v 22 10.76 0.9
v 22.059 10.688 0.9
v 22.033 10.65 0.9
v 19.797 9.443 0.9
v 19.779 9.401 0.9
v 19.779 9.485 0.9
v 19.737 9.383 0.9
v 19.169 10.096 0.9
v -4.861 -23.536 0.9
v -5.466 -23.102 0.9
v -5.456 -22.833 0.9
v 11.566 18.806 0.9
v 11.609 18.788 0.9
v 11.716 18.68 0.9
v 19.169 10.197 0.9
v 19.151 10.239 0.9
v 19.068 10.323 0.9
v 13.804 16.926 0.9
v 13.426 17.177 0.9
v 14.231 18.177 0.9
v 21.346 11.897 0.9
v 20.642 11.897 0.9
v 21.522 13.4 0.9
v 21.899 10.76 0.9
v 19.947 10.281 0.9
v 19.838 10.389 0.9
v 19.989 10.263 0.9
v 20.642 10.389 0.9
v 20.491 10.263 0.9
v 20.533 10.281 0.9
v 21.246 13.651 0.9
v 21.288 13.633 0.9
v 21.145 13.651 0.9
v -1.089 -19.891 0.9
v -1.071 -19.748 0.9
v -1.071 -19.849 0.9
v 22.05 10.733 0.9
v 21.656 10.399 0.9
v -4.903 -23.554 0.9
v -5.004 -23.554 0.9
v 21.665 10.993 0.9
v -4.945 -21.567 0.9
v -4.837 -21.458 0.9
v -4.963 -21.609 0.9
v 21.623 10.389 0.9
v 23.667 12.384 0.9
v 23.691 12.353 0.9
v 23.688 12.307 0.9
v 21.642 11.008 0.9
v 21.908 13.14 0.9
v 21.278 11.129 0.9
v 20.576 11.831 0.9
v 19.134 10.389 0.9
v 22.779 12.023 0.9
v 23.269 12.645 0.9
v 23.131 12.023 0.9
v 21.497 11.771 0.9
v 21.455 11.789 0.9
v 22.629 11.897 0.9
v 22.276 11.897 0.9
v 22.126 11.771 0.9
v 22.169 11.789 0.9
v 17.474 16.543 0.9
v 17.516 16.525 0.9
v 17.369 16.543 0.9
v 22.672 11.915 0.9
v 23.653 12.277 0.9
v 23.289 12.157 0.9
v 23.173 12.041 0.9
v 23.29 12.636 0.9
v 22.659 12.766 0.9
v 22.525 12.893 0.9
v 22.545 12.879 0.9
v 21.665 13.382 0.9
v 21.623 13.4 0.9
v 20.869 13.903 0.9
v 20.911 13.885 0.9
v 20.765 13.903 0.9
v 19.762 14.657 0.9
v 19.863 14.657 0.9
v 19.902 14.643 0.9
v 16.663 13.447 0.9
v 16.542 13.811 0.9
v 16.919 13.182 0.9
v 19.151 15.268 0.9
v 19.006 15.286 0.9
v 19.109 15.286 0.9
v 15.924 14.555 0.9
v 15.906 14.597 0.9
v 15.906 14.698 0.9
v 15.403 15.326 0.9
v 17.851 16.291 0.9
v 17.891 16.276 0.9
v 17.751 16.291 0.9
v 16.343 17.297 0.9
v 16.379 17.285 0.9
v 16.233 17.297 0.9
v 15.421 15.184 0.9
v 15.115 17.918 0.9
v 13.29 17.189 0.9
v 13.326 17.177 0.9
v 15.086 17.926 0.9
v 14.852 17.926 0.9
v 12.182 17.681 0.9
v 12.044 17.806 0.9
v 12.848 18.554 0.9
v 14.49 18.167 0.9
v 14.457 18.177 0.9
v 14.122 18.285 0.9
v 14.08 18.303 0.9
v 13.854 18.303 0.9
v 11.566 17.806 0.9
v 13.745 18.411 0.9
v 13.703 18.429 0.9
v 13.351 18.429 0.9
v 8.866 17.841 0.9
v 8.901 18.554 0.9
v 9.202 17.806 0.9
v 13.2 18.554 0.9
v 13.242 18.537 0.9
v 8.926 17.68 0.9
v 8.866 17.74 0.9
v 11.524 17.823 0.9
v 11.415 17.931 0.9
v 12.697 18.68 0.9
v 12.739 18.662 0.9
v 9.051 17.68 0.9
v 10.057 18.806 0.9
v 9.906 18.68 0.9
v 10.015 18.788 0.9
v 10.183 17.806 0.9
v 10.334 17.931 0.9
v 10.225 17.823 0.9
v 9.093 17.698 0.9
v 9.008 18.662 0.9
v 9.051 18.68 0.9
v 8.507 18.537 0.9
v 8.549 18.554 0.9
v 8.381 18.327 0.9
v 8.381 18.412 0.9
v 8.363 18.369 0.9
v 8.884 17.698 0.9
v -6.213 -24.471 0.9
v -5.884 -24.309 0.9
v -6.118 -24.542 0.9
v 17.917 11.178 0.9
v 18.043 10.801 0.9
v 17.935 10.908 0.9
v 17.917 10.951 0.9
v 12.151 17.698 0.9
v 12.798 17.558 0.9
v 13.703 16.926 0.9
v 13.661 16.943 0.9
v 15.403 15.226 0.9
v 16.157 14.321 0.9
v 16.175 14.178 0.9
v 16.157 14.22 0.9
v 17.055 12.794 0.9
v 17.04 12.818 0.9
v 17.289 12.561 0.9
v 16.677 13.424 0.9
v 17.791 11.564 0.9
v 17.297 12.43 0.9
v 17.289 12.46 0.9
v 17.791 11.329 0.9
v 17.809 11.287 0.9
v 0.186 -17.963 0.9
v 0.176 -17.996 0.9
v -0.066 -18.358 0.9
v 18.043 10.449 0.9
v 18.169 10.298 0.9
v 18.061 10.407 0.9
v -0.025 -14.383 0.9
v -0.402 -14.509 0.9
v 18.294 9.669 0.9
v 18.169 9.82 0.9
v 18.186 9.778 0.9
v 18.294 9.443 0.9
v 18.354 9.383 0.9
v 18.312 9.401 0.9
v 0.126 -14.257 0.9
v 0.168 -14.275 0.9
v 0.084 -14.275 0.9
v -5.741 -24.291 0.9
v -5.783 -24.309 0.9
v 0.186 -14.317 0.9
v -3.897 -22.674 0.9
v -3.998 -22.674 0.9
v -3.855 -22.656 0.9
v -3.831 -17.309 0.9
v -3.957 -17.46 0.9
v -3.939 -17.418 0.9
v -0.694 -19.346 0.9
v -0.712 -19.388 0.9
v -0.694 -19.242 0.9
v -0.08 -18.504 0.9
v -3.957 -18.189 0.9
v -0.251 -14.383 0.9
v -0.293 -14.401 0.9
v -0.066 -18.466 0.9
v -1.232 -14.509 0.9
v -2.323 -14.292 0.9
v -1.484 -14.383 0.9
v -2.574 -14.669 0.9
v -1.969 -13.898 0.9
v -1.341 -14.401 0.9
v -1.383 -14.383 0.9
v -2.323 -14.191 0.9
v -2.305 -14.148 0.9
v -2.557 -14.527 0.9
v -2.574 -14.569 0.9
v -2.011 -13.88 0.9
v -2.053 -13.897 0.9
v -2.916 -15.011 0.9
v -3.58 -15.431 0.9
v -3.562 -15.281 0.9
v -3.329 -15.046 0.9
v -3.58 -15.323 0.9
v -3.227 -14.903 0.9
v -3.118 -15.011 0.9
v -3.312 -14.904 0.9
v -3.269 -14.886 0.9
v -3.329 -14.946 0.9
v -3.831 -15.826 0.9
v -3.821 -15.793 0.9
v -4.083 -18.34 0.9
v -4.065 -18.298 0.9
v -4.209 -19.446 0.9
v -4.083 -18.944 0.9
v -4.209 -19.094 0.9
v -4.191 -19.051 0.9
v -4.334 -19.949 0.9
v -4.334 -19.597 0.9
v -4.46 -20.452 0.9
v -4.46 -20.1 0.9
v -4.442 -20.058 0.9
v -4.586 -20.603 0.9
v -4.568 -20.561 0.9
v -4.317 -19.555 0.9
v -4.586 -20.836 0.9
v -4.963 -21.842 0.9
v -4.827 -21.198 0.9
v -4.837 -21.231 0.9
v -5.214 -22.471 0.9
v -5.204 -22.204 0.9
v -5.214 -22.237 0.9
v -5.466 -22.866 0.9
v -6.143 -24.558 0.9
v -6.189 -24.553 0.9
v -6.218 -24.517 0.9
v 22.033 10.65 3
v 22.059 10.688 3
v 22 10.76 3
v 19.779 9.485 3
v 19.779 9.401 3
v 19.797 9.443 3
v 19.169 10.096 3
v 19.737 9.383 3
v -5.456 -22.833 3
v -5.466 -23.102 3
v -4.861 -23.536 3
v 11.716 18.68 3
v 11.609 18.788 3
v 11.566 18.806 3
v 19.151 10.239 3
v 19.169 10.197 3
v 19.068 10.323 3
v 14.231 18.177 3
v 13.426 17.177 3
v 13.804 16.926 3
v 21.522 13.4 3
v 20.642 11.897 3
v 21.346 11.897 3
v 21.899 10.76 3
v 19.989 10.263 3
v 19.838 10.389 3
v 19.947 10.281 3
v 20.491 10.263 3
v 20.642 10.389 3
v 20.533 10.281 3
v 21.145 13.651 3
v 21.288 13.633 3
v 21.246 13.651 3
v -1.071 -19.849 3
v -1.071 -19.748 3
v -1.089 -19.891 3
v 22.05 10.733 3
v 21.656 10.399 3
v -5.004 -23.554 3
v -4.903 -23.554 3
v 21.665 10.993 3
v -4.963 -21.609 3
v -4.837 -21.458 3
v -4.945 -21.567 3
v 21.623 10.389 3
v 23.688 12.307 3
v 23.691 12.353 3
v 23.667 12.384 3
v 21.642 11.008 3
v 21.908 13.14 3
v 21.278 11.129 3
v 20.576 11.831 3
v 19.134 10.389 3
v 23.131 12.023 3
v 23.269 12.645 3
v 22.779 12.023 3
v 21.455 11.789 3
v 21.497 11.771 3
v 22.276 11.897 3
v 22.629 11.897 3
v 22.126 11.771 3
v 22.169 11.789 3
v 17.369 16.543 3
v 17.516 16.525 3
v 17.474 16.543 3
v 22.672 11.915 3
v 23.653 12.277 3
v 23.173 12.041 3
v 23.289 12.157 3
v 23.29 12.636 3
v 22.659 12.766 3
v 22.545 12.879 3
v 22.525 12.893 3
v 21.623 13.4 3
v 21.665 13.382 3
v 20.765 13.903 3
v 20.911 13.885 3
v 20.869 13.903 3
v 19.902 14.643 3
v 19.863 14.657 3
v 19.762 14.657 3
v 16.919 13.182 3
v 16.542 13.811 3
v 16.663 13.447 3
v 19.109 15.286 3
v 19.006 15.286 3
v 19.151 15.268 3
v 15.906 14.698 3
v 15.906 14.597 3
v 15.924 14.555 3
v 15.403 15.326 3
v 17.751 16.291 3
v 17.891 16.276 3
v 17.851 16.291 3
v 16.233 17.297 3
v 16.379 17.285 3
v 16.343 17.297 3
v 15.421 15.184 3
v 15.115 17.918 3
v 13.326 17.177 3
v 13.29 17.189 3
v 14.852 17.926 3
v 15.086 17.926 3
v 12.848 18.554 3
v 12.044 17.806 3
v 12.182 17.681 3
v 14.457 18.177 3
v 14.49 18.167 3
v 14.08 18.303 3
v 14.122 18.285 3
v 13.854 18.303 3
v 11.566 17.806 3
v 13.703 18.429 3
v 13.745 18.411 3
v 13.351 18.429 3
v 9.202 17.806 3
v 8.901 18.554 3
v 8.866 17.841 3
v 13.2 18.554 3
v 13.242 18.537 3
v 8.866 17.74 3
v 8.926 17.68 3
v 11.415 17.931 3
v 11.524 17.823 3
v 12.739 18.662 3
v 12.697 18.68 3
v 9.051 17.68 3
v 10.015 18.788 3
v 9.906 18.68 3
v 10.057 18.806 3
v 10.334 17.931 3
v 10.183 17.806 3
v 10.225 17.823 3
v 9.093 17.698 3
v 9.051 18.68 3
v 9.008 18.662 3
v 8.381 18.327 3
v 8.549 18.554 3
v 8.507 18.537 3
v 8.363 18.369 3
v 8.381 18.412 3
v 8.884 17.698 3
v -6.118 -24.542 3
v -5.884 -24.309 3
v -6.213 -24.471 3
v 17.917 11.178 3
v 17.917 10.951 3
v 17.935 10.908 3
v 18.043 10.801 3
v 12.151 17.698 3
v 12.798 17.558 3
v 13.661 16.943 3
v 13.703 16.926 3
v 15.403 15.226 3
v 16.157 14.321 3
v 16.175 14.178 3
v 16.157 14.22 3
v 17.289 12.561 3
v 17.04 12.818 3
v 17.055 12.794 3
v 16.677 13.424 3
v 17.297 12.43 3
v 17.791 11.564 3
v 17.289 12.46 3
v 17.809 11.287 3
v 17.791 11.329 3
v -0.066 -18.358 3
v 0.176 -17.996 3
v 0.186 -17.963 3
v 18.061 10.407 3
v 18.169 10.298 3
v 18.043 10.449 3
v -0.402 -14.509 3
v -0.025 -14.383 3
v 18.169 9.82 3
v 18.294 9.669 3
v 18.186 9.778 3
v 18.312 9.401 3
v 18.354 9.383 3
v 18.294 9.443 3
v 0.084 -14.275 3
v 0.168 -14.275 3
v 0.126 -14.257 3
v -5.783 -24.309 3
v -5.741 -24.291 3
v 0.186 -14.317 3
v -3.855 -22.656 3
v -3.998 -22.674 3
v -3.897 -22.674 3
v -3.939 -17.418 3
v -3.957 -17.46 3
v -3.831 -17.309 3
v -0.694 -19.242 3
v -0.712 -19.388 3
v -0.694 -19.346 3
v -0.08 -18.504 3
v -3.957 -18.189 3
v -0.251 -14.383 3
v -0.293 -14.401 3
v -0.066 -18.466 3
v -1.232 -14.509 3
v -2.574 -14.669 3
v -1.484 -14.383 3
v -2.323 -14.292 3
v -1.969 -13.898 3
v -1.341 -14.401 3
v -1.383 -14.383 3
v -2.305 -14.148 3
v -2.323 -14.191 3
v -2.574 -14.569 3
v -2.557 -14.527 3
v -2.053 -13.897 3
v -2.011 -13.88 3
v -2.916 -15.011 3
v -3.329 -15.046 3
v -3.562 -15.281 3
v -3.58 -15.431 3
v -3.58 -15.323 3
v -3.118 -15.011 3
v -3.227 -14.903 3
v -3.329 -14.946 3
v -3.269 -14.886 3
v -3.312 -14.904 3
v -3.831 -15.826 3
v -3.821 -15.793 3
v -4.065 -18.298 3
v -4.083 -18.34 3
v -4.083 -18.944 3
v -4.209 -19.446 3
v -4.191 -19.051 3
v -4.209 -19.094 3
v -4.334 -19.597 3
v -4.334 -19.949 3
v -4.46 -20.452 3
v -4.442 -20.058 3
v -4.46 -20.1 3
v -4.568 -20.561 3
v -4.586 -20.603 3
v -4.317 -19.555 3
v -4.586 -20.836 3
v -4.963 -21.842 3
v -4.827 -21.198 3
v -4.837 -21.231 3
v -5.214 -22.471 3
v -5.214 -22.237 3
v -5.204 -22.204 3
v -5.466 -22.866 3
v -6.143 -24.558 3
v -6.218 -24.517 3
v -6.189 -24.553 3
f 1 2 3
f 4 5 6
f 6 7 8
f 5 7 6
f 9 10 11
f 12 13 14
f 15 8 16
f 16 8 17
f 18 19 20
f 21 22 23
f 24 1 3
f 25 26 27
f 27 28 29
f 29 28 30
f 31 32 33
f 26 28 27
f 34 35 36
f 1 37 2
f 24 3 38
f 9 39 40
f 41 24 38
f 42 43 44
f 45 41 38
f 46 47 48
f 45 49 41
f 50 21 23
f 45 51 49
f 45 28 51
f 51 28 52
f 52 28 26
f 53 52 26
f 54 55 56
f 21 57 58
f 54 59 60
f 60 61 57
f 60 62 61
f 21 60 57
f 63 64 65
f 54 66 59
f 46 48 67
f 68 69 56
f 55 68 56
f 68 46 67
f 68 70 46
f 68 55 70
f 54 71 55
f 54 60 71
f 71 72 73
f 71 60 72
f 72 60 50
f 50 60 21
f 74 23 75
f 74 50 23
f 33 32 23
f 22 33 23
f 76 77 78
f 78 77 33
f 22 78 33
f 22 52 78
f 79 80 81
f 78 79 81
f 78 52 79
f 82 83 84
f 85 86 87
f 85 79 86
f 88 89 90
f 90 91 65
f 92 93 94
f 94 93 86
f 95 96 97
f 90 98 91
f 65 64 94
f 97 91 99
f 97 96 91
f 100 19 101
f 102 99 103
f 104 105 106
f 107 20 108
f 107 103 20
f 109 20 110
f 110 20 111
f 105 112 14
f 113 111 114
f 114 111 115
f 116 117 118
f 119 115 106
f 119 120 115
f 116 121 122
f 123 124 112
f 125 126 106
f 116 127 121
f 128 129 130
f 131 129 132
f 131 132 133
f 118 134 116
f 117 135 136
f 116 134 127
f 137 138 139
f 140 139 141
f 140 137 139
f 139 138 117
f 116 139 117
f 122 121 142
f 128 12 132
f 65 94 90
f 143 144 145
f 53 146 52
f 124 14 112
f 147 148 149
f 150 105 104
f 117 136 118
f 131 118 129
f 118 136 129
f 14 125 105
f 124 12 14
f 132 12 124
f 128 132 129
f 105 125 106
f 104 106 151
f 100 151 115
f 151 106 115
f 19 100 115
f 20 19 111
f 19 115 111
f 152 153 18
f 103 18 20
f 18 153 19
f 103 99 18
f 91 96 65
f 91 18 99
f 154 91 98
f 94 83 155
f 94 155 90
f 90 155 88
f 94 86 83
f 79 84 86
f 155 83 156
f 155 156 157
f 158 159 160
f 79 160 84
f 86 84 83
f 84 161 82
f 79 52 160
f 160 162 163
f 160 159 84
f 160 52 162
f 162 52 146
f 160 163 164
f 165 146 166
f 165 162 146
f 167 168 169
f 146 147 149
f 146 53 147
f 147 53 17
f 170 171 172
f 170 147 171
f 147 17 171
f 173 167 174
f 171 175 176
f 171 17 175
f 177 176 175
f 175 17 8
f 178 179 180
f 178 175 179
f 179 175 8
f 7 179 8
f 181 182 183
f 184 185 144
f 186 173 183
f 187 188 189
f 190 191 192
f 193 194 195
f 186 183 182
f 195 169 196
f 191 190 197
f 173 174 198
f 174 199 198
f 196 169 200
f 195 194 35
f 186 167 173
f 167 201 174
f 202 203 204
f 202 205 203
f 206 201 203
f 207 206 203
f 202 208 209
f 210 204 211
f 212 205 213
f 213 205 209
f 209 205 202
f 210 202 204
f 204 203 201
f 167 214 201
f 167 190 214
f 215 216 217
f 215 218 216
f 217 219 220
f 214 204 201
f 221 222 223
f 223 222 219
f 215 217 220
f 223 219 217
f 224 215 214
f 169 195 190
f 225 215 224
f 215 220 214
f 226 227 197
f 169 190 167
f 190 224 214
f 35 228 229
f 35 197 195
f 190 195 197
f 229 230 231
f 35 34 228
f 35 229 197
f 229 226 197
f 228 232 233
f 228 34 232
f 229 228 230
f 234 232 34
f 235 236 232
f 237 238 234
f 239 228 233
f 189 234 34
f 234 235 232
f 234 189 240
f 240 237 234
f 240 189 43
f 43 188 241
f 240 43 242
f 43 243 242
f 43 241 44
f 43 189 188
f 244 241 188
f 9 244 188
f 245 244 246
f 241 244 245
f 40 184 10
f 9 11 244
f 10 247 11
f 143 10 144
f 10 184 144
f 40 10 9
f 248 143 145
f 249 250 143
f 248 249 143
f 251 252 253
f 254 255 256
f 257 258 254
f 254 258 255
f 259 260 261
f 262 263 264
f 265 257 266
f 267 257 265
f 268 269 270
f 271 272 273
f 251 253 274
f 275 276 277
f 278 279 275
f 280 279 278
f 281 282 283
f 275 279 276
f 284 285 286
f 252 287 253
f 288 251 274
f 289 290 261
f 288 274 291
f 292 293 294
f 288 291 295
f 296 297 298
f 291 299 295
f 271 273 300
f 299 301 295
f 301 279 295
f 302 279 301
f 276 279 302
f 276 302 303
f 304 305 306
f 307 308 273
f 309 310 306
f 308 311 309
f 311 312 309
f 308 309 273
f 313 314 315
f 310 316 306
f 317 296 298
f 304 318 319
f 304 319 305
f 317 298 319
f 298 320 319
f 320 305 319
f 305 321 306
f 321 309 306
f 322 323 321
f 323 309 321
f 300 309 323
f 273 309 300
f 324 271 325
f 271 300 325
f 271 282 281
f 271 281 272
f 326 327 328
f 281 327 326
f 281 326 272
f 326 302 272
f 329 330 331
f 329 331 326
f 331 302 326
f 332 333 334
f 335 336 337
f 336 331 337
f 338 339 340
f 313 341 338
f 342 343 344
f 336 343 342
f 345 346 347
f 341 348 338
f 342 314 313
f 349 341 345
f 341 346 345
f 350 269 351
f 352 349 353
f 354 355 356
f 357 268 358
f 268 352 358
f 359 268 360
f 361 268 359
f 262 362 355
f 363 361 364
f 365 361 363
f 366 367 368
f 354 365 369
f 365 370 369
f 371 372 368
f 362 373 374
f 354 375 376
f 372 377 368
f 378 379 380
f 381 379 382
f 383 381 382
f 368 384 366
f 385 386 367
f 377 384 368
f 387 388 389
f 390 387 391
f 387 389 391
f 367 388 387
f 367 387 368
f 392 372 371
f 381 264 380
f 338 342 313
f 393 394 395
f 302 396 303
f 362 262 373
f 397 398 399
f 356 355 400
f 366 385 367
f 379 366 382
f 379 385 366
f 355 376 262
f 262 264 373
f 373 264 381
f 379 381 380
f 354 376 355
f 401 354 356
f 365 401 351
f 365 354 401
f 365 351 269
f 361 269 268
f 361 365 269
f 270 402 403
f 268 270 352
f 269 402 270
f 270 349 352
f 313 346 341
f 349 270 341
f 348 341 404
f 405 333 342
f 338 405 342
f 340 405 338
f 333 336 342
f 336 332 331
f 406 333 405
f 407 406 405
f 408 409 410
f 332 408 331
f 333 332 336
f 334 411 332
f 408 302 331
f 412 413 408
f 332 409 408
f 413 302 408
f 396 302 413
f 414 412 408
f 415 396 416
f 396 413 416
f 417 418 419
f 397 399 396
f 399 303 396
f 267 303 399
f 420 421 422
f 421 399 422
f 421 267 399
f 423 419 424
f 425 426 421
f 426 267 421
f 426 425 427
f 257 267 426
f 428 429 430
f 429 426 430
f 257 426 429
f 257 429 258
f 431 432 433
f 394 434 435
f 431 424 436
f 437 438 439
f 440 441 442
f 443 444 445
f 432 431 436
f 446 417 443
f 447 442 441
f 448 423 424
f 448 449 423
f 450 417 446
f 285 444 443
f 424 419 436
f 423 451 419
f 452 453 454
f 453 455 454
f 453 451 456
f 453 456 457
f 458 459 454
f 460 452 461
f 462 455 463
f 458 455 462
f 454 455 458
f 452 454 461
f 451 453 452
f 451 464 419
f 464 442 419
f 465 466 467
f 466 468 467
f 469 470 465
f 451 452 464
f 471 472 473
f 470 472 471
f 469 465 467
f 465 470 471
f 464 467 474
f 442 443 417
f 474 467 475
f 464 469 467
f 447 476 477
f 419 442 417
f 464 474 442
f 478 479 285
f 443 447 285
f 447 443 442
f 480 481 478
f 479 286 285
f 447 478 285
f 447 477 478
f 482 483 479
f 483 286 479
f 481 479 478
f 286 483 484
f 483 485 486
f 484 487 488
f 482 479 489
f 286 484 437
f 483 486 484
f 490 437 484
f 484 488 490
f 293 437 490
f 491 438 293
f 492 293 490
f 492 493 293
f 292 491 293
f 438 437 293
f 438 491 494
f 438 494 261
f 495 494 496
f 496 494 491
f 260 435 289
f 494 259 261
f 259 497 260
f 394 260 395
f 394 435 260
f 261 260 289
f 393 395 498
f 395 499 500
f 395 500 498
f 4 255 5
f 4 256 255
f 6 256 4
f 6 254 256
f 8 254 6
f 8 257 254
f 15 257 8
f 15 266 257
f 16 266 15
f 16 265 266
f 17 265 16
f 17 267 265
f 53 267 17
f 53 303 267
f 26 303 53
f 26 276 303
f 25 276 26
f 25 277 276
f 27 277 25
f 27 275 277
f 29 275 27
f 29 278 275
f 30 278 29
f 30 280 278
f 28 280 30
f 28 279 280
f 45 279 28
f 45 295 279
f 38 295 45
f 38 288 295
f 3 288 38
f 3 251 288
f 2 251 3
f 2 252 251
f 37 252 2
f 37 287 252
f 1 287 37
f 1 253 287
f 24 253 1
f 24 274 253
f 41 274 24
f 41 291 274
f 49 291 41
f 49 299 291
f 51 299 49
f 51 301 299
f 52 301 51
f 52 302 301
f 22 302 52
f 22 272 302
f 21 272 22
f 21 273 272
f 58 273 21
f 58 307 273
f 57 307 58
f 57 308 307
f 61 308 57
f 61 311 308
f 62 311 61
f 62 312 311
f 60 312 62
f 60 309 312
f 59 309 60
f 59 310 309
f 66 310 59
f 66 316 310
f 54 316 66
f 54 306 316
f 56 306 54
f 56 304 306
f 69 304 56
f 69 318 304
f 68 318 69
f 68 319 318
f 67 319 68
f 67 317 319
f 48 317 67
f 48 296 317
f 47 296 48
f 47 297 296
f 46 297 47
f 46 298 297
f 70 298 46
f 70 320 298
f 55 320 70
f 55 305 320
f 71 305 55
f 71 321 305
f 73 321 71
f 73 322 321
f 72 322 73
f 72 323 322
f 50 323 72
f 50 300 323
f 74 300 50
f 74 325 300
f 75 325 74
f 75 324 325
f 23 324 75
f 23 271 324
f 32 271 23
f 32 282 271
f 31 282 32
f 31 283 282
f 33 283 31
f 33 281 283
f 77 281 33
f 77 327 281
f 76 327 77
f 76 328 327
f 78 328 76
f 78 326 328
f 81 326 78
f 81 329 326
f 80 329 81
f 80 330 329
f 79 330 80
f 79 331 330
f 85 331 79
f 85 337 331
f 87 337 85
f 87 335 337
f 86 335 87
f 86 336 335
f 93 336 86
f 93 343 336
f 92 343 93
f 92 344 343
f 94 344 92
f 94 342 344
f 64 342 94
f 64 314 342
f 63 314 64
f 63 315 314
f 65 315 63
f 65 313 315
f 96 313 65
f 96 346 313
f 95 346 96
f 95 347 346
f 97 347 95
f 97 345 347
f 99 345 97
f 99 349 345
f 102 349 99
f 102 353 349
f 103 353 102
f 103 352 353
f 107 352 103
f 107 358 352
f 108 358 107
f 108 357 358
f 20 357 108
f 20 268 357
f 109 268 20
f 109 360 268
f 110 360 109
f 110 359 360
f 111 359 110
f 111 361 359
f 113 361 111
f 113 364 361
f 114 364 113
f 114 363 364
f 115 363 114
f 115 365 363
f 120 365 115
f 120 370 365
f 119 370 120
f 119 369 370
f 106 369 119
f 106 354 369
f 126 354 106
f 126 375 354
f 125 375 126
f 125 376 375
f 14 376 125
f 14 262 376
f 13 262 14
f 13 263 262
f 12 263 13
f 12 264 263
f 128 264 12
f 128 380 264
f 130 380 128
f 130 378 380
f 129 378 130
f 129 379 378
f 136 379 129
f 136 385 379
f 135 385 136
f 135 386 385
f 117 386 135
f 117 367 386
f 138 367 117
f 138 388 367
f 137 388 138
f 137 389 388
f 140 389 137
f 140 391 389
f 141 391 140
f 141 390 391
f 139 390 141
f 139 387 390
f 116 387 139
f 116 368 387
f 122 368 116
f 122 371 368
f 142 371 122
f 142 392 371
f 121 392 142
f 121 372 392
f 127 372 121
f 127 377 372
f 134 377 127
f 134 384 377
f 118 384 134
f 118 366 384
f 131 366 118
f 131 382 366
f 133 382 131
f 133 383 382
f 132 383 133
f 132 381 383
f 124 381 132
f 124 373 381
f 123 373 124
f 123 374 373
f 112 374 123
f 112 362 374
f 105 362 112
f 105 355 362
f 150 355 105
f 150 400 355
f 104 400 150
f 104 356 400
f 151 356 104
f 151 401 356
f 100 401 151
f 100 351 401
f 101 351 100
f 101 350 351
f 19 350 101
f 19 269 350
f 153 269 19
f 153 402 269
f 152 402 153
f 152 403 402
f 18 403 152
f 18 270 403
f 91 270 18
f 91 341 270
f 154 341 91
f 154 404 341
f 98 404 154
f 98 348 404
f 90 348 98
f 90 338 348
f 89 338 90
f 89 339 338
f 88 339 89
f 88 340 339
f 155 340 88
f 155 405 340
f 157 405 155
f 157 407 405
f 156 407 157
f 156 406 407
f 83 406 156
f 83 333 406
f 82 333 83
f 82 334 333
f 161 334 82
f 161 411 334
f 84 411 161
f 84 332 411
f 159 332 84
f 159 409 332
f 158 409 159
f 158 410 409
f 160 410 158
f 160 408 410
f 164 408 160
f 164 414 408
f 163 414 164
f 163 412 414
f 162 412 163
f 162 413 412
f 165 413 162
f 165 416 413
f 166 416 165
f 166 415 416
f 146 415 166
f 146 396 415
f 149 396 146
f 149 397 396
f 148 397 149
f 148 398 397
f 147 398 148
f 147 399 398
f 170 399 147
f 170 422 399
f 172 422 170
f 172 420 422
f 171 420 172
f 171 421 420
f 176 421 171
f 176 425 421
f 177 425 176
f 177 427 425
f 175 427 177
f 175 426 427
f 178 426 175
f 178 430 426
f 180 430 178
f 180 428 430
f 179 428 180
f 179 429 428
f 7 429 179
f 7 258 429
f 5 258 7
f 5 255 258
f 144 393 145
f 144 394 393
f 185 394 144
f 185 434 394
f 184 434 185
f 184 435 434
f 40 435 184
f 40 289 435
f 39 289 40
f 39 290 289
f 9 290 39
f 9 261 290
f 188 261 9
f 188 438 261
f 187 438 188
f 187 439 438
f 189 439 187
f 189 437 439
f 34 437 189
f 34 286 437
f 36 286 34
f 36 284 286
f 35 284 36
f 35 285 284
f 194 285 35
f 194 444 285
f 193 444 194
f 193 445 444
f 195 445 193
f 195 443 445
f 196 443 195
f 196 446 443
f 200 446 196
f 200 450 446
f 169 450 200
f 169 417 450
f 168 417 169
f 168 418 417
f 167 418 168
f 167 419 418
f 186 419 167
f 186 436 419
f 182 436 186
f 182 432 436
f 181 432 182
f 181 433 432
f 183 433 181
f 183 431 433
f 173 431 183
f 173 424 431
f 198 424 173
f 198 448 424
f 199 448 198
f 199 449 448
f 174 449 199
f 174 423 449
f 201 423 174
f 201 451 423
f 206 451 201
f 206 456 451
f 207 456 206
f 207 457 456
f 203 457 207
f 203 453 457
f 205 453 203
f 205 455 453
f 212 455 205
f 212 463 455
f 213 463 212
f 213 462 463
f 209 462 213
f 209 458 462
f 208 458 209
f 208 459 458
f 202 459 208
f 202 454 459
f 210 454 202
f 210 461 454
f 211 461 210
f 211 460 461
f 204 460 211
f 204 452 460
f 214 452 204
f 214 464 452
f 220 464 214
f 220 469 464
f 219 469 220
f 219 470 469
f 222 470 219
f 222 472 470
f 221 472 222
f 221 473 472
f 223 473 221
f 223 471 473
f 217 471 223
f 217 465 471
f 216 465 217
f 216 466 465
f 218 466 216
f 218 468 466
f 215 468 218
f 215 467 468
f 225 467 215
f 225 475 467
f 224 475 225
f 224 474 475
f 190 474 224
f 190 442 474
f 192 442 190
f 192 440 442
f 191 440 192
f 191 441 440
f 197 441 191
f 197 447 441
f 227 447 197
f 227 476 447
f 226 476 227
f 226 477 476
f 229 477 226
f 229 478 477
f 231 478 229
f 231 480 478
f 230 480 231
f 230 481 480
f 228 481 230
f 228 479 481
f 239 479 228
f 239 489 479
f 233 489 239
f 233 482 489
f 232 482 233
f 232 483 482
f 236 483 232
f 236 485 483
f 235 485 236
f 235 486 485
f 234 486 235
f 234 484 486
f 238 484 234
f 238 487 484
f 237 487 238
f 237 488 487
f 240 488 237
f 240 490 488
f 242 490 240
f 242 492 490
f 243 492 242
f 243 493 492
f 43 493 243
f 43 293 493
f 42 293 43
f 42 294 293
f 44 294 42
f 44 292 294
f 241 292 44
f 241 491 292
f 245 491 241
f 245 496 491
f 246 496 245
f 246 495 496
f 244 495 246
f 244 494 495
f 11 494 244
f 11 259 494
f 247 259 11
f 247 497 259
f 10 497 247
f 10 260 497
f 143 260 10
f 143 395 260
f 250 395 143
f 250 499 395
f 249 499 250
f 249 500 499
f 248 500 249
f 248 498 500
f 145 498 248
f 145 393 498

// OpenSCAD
$fn = 24;
translate([0, -2.500, 0.900])
  linear_extrude(height=2.100) {
offset(r=0.06, $fn=8) {
    polygon(points=[[0.126,-11.817],[0.000,-11.943],[-0.251,-11.943],[-0.377,-12.069],[-1.257,-12.069],[-1.383,-11.943],[-1.509,-11.943],[-2.011,-11.440],[-2.011,-11.314],[-2.011,-11.440],[-2.263,-11.691],[-2.263,-11.817],[-2.514,-12.069],[-2.514,-12.194],[-2.891,-12.571],[-3.143,-12.571],[-3.269,-12.446],[-3.269,-12.571],[-3.520,-12.823],[-3.520,-12.949],[-3.771,-13.326],[-3.771,-14.834],[-3.897,-14.960],[-3.897,-15.714],[-4.023,-15.840],[-4.023,-16.469],[-4.149,-16.594],[-4.149,-16.971],[-4.274,-17.097],[-4.274,-17.474],[-4.400,-17.600],[-4.400,-17.977],[-4.526,-18.103],[-4.526,-18.354],[-4.777,-18.731],[-4.777,-18.983],[-4.903,-19.109],[-4.903,-19.360],[-5.154,-19.737],[-5.154,-19.989],[-5.406,-20.366],[-5.406,-20.617],[-6.160,-22.000],[-5.909,-21.749],[-5.783,-21.749],[-5.029,-20.994],[-4.903,-20.994],[-4.023,-20.114],[-3.897,-20.114],[-1.131,-17.349],[-1.131,-17.223],[-0.754,-16.846],[-0.754,-16.720],[-0.126,-15.966],[-0.126,-15.840],[0.126,-15.463]], paths=[[0,1,2,3,4,5,6,7,8,9,10,11,12,13,14,15,16,17,18,19,20,21,22,23,24,25,26,27,28,29,30,31,32,33,34,35,36,37,38,39,40,41,42,43,44,45,46,47,48,49,50,51,52,53,54,55]]);
    polygon(points=[[8.423,20.869],[8.926,20.366],[8.926,20.240],[9.051,20.240],[9.177,20.366],[10.183,20.366],[10.309,20.491],[11.440,20.491],[11.566,20.366],[12.069,20.366],[12.194,20.240],[12.823,20.114],[13.326,19.737],[13.451,19.737],[13.703,19.486],[13.829,19.486],[15.463,17.851],[15.463,17.726],[15.966,17.223],[15.966,17.097],[16.217,16.846],[16.217,16.720],[16.594,16.343],[16.720,15.966],[16.971,15.714],[17.097,15.337],[17.349,15.086],[17.349,14.960],[17.851,14.080],[17.851,13.829],[17.977,13.703],[17.977,13.451],[18.103,13.326],[18.103,12.949],[18.229,12.823],[18.229,12.320],[18.354,12.194],[18.354,11.943],[19.737,11.943],[19.109,12.571],[19.109,12.697],[18.983,12.823],[19.109,12.949],[19.863,12.949],[19.989,12.823],[20.491,12.823],[20.617,12.949],[21.623,12.949],[22.000,13.200],[21.874,13.200],[21.623,13.451],[21.246,13.577],[20.491,14.331],[20.617,14.457],[21.371,14.457],[21.497,14.331],[22.126,14.331],[22.251,14.457],[22.629,14.457],[22.754,14.583],[23.131,14.583],[23.257,14.709],[23.634,14.834],[23.257,15.086],[22.629,15.211],[22.503,15.337],[21.874,15.589],[21.623,15.840],[21.497,15.840],[21.246,16.091],[21.120,16.091],[20.869,16.343],[20.743,16.343],[19.863,17.097],[19.737,17.097],[19.109,17.726],[18.983,17.726],[17.851,18.731],[17.726,18.731],[17.474,18.983],[17.349,18.983],[16.343,19.737],[16.217,19.737],[15.086,20.366],[14.834,20.366],[14.457,20.617],[14.206,20.617],[14.080,20.743],[13.829,20.743],[13.703,20.869],[13.326,20.869],[13.200,20.994],[12.823,20.994],[12.697,21.120],[11.691,21.120],[11.566,21.246],[10.057,21.246],[9.931,21.120],[9.051,21.120],[8.926,20.994],[8.549,20.994]], paths=[[0,1,2,3,4,5,6,7,8,9,10,11,12,13,14,15,16,17,18,19,20,21,22,23,24,25,26,27,28,29,30,31,32,33,34,35,36,37,38,39,40,41,42,43,44,45,46,47,48,49,50,51,52,53,54,55,56,57,58,59,60,61,62,63,64,65,66,67,68,69,70,71,72,73,74,75,76,77,78,79,80,81,82,83,84,85,86,87,88,89,90,91,92,93,94,95,96,97,98,99,100]]);
}
}
